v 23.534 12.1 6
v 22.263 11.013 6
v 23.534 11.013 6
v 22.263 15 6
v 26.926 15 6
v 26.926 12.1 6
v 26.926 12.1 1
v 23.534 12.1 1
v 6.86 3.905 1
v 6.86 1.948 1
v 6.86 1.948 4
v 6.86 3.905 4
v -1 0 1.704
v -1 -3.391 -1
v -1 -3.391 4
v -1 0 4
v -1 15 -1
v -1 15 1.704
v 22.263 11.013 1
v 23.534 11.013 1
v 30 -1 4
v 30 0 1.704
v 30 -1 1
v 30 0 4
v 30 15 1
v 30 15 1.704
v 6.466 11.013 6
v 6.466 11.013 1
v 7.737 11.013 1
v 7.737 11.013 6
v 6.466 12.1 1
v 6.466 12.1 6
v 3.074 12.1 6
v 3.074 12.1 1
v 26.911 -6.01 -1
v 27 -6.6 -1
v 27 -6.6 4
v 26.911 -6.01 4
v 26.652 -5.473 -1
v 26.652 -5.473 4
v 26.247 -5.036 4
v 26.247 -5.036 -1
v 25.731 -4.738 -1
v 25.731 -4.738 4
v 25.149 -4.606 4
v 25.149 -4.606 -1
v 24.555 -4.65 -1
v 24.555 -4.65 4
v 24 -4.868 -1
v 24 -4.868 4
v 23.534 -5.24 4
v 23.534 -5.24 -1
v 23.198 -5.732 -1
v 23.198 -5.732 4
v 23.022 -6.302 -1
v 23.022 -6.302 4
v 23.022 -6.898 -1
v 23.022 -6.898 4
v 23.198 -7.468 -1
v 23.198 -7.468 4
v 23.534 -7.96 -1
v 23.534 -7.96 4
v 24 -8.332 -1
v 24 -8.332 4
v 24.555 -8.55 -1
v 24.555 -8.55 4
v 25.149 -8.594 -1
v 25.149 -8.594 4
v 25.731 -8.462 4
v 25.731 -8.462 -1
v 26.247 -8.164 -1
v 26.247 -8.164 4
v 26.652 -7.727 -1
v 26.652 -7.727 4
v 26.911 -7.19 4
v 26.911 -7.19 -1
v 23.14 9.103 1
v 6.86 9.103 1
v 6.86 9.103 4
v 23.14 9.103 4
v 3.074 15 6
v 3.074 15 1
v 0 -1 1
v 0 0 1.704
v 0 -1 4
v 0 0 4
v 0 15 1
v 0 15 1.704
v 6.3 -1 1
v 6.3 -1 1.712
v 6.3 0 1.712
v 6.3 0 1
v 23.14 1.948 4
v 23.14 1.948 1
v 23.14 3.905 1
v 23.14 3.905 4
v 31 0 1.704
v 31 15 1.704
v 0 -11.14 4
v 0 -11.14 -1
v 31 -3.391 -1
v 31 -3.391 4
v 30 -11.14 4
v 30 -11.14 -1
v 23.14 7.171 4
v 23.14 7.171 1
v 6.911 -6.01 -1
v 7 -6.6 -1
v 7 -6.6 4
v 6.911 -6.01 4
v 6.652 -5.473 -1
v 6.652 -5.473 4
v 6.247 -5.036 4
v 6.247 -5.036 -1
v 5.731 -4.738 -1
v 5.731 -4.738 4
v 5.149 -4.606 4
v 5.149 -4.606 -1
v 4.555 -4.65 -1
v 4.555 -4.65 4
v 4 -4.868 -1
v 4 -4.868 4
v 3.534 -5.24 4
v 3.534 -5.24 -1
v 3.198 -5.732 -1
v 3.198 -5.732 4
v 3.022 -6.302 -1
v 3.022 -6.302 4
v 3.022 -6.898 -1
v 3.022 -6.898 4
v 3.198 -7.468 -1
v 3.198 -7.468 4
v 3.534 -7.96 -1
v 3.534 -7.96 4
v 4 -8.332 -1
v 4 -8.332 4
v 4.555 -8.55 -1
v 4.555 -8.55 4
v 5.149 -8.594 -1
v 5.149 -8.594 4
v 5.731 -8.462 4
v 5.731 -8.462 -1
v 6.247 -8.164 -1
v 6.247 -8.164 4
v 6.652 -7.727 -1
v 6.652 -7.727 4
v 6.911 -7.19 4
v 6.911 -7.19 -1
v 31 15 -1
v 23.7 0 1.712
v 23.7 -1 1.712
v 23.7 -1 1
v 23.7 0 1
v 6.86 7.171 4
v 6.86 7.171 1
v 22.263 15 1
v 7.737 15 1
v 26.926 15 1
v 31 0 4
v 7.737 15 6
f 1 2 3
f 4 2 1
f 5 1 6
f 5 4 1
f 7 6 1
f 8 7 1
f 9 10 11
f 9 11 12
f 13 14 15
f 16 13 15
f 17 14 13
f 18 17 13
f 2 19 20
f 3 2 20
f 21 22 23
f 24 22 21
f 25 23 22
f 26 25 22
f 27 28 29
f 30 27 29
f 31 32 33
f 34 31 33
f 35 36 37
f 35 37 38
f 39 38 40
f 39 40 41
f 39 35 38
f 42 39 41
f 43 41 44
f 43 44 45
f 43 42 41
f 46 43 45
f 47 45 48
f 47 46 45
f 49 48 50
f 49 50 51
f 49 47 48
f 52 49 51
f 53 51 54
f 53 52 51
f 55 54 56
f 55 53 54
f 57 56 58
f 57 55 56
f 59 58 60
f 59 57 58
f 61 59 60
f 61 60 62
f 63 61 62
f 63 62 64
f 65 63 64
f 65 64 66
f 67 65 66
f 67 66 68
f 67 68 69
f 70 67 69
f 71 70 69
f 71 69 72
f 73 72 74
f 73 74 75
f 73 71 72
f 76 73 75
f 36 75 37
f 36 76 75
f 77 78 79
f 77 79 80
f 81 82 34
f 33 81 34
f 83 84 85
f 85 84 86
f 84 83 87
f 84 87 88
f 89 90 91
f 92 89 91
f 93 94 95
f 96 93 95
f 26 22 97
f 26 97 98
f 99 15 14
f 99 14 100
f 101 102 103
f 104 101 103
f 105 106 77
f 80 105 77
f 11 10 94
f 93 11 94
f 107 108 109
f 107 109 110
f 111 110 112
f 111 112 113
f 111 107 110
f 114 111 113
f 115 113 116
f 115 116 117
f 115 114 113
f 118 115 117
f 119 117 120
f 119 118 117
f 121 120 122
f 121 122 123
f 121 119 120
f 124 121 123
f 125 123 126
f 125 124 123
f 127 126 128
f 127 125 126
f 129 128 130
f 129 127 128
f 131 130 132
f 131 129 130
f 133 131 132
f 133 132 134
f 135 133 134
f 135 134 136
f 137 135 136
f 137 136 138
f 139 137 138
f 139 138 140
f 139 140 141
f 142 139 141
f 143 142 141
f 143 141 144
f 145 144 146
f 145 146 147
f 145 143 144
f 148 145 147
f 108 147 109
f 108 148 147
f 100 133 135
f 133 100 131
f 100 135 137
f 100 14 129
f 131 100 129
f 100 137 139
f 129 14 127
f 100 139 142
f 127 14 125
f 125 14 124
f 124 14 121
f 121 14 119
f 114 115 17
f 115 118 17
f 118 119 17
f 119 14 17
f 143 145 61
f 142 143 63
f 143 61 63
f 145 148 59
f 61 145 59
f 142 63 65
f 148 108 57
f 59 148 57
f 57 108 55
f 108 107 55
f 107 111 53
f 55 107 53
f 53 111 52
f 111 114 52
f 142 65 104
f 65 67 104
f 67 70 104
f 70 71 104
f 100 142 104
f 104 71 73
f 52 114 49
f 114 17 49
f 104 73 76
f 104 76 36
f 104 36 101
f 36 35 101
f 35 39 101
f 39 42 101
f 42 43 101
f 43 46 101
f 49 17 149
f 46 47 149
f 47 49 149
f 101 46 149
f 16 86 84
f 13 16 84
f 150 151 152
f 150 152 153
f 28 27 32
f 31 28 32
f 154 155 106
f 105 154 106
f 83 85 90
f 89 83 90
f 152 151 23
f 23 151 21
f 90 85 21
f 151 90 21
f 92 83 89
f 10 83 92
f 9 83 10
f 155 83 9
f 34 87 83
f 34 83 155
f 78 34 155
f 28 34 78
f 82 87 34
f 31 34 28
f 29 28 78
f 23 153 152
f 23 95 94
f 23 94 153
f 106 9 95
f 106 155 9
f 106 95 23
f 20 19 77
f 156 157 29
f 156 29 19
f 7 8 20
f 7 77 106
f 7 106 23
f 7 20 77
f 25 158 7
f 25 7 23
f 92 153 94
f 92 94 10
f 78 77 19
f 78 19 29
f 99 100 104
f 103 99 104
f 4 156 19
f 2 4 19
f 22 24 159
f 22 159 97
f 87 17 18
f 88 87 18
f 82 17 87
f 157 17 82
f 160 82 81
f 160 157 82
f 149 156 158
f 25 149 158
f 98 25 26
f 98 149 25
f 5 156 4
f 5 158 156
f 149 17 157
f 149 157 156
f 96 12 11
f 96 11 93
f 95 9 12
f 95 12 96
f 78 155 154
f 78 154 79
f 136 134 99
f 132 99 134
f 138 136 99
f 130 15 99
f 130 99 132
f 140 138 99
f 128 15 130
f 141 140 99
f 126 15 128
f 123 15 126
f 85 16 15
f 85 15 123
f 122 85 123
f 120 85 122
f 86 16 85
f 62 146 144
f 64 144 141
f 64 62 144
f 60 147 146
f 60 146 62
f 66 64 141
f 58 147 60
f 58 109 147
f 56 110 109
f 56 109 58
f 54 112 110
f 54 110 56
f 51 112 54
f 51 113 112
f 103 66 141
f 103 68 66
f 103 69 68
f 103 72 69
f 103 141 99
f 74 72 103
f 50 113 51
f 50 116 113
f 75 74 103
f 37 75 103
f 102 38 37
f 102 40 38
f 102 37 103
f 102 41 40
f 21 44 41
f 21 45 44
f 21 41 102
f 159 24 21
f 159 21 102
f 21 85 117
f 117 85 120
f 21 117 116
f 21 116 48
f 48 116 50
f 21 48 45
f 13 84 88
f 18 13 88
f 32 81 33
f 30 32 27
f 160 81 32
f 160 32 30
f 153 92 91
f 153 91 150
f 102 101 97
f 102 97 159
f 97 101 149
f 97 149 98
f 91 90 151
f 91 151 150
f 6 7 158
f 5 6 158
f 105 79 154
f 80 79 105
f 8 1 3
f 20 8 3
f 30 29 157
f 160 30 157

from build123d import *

# Parameters (mm, degrees)
SKETCH_1_W           = 30
SKETCH_1_H           = 15
EXTRUDE_1_DEPTH      = 1
EXTRUDE_2_DEPTH      = 3
EXTRUDE_2_DEPTH_BACK = 2
SKETCH_2_W           = 30
SKETCH_2_H           = 11.139726918
SKETCH_2_R           = 2
SKETCH_3_W           = 6.3
SKETCH_3_H           = 1
CUT_EXTRUDE_1_DEPTH  = 3
EXTRUDE_3_DEPTH      = 1
EXTRUDE_4_DEPTH      = 5
CUT_EXTRUDE_2_REACH  = 31.173
SKETCH_8_W           = 2.28807502
SKETCH_8_H           = 1
EXTRUDE_6_DEPTH      = 5
SKETCH_10_W          = 16.28
SKETCH_10_H          = 1.956604577
SKETCH_10_H_2        = 1.932582498
EXTRUDE_7_DEPTH      = 3
CUT_EXTRUDE_3_DEPTH  = 5


with BuildPart() as part:
    # 草图1 → 凸台-拉伸1 (new, symmetric)
    with BuildSketch(Plane.XY):
        with Locations((15, 7.5)):
            Rectangle(SKETCH_1_W, SKETCH_1_H)
    extrude(amount=EXTRUDE_1_DEPTH, both=True)

    # 草图2 → 凸台-拉伸2 (add, two sides: drawn at the far end of the back side and taken through both)
    with BuildSketch(Plane.XY.offset(1).offset(-EXTRUDE_2_DEPTH_BACK)):
        with Locations((15, -5.569863459)):
            Rectangle(SKETCH_2_W, SKETCH_2_H)
        with Locations((25, -6.6)):
            Circle(SKETCH_2_R, mode=Mode.SUBTRACT)
        with Locations((5, -6.6)):
            Circle(SKETCH_2_R, mode=Mode.SUBTRACT)
    extrude(amount=EXTRUDE_2_DEPTH + EXTRUDE_2_DEPTH_BACK)

    # 草图3 → 切除-拉伸1 (cut)
    with BuildSketch(Plane.XY.offset(4)):
        with Locations((26.85, -0.5)):
            Rectangle(SKETCH_3_W, SKETCH_3_H)
        with Locations((3.15, -0.5)):
            Rectangle(SKETCH_3_W, SKETCH_3_H)
    extrude(amount=-CUT_EXTRUDE_1_DEPTH, mode=Mode.SUBTRACT)

    # 草图4 → 凸台-拉伸3 (add)
    with BuildSketch(Plane(origin=(30, 0, 0), x_dir=(0, 0, -1), z_dir=(1, 0, 0))):
        Polygon((-1.704019465, 0), (-1.704019465, 15), (-1, 15), (1, 15), (1, -3.390976711), (-4, -3.390976711), (-4, 0), align=None)
    extrude_3 = extrude(amount=EXTRUDE_3_DEPTH)

    # 草图5 → 凸台-拉伸4 (add)
    with BuildSketch(Plane.XY.offset(4)):
        Polygon((31, -3.390976711), (30, -11.139726918), (30, -3.390976711), align=None)
    extrude_4 = extrude(amount=-EXTRUDE_4_DEPTH)

    # 镜向1: 凸台-拉伸3, 凸台-拉伸4 across plane
    add(extrude_3.mirror(Plane(origin=(15, 0, 0), x_dir=(0, 0, 1), z_dir=(1, 0, 0))))
    add(extrude_4.mirror(Plane(origin=(15, 0, 0), x_dir=(0, 0, 1), z_dir=(1, 0, 0))))

    # 草图8 → 切除-拉伸2 (cut, up to next)
    with BuildSketch(Plane.ZY.offset(-6.3), mode=Mode.PRIVATE) as cut_extrude_2_sk1:
        with Locations((2.85596249, -0.5)):
            Rectangle(SKETCH_8_W, SKETCH_8_H)
    cut_extrude_2_tool1 = extrude(cut_extrude_2_sk1.sketch, amount=-CUT_EXTRUDE_2_REACH, mode=Mode.PRIVATE) & part.part
    add(cut_extrude_2_tool1.solids().sort_by_distance((6.3, -0.5, 2.855962))[0], mode=Mode.SUBTRACT)

    # 草图9 → 凸台-拉伸6 (add)
    with BuildSketch(Plane.XY.offset(1)):
        Polygon((6.147776054, 15), (3.073888027, 15), (3.073888027, 11.936980184), (6.147776054, 11.936980184), (6.246340003, 11.936980184), (6.246340003, 11.013255946), (7.737344454, 11.013255946), (7.737344454, 15), align=None)
        Polygon((23.852223946, 15), (22.262655546, 15), (22.262655546, 11.013255946), (23.753659997, 11.013255946), (23.753659997, 11.936980184), (23.852223946, 11.936980184), (26.926111973, 11.936980184), (26.926111973, 15), align=None)
    extrude(amount=EXTRUDE_6_DEPTH)

    # 草图10 → 凸台-拉伸7 (add)
    with BuildSketch(Plane.XY.offset(1)):
        with Locations((15, 2.926222334)):
            Rectangle(SKETCH_10_W, SKETCH_10_H)
        with Locations((15, 8.136975565)):
            Rectangle(SKETCH_10_W, SKETCH_10_H_2)
    extrude(amount=EXTRUDE_7_DEPTH)

    # 草图11 → 切除-拉伸3 (cut)
    with BuildSketch(Plane.XY.offset(6)):
        Polygon((3.073888027, 11.936980184), (6.246340003, 11.936980184), (6.246340003, 11.013255946), (6.465703182, 11.013255946), (6.465703182, 12.1), (3.073888027, 12.1), align=None)
        Polygon((26.926111973, 11.936980184), (26.926111973, 12.1), (23.534296818, 12.1), (23.534296818, 11.013255946), (23.753659997, 11.013255946), (23.753659997, 11.936980184), align=None)
    extrude(amount=-CUT_EXTRUDE_3_DEPTH, mode=Mode.SUBTRACT)


solid = part.part
